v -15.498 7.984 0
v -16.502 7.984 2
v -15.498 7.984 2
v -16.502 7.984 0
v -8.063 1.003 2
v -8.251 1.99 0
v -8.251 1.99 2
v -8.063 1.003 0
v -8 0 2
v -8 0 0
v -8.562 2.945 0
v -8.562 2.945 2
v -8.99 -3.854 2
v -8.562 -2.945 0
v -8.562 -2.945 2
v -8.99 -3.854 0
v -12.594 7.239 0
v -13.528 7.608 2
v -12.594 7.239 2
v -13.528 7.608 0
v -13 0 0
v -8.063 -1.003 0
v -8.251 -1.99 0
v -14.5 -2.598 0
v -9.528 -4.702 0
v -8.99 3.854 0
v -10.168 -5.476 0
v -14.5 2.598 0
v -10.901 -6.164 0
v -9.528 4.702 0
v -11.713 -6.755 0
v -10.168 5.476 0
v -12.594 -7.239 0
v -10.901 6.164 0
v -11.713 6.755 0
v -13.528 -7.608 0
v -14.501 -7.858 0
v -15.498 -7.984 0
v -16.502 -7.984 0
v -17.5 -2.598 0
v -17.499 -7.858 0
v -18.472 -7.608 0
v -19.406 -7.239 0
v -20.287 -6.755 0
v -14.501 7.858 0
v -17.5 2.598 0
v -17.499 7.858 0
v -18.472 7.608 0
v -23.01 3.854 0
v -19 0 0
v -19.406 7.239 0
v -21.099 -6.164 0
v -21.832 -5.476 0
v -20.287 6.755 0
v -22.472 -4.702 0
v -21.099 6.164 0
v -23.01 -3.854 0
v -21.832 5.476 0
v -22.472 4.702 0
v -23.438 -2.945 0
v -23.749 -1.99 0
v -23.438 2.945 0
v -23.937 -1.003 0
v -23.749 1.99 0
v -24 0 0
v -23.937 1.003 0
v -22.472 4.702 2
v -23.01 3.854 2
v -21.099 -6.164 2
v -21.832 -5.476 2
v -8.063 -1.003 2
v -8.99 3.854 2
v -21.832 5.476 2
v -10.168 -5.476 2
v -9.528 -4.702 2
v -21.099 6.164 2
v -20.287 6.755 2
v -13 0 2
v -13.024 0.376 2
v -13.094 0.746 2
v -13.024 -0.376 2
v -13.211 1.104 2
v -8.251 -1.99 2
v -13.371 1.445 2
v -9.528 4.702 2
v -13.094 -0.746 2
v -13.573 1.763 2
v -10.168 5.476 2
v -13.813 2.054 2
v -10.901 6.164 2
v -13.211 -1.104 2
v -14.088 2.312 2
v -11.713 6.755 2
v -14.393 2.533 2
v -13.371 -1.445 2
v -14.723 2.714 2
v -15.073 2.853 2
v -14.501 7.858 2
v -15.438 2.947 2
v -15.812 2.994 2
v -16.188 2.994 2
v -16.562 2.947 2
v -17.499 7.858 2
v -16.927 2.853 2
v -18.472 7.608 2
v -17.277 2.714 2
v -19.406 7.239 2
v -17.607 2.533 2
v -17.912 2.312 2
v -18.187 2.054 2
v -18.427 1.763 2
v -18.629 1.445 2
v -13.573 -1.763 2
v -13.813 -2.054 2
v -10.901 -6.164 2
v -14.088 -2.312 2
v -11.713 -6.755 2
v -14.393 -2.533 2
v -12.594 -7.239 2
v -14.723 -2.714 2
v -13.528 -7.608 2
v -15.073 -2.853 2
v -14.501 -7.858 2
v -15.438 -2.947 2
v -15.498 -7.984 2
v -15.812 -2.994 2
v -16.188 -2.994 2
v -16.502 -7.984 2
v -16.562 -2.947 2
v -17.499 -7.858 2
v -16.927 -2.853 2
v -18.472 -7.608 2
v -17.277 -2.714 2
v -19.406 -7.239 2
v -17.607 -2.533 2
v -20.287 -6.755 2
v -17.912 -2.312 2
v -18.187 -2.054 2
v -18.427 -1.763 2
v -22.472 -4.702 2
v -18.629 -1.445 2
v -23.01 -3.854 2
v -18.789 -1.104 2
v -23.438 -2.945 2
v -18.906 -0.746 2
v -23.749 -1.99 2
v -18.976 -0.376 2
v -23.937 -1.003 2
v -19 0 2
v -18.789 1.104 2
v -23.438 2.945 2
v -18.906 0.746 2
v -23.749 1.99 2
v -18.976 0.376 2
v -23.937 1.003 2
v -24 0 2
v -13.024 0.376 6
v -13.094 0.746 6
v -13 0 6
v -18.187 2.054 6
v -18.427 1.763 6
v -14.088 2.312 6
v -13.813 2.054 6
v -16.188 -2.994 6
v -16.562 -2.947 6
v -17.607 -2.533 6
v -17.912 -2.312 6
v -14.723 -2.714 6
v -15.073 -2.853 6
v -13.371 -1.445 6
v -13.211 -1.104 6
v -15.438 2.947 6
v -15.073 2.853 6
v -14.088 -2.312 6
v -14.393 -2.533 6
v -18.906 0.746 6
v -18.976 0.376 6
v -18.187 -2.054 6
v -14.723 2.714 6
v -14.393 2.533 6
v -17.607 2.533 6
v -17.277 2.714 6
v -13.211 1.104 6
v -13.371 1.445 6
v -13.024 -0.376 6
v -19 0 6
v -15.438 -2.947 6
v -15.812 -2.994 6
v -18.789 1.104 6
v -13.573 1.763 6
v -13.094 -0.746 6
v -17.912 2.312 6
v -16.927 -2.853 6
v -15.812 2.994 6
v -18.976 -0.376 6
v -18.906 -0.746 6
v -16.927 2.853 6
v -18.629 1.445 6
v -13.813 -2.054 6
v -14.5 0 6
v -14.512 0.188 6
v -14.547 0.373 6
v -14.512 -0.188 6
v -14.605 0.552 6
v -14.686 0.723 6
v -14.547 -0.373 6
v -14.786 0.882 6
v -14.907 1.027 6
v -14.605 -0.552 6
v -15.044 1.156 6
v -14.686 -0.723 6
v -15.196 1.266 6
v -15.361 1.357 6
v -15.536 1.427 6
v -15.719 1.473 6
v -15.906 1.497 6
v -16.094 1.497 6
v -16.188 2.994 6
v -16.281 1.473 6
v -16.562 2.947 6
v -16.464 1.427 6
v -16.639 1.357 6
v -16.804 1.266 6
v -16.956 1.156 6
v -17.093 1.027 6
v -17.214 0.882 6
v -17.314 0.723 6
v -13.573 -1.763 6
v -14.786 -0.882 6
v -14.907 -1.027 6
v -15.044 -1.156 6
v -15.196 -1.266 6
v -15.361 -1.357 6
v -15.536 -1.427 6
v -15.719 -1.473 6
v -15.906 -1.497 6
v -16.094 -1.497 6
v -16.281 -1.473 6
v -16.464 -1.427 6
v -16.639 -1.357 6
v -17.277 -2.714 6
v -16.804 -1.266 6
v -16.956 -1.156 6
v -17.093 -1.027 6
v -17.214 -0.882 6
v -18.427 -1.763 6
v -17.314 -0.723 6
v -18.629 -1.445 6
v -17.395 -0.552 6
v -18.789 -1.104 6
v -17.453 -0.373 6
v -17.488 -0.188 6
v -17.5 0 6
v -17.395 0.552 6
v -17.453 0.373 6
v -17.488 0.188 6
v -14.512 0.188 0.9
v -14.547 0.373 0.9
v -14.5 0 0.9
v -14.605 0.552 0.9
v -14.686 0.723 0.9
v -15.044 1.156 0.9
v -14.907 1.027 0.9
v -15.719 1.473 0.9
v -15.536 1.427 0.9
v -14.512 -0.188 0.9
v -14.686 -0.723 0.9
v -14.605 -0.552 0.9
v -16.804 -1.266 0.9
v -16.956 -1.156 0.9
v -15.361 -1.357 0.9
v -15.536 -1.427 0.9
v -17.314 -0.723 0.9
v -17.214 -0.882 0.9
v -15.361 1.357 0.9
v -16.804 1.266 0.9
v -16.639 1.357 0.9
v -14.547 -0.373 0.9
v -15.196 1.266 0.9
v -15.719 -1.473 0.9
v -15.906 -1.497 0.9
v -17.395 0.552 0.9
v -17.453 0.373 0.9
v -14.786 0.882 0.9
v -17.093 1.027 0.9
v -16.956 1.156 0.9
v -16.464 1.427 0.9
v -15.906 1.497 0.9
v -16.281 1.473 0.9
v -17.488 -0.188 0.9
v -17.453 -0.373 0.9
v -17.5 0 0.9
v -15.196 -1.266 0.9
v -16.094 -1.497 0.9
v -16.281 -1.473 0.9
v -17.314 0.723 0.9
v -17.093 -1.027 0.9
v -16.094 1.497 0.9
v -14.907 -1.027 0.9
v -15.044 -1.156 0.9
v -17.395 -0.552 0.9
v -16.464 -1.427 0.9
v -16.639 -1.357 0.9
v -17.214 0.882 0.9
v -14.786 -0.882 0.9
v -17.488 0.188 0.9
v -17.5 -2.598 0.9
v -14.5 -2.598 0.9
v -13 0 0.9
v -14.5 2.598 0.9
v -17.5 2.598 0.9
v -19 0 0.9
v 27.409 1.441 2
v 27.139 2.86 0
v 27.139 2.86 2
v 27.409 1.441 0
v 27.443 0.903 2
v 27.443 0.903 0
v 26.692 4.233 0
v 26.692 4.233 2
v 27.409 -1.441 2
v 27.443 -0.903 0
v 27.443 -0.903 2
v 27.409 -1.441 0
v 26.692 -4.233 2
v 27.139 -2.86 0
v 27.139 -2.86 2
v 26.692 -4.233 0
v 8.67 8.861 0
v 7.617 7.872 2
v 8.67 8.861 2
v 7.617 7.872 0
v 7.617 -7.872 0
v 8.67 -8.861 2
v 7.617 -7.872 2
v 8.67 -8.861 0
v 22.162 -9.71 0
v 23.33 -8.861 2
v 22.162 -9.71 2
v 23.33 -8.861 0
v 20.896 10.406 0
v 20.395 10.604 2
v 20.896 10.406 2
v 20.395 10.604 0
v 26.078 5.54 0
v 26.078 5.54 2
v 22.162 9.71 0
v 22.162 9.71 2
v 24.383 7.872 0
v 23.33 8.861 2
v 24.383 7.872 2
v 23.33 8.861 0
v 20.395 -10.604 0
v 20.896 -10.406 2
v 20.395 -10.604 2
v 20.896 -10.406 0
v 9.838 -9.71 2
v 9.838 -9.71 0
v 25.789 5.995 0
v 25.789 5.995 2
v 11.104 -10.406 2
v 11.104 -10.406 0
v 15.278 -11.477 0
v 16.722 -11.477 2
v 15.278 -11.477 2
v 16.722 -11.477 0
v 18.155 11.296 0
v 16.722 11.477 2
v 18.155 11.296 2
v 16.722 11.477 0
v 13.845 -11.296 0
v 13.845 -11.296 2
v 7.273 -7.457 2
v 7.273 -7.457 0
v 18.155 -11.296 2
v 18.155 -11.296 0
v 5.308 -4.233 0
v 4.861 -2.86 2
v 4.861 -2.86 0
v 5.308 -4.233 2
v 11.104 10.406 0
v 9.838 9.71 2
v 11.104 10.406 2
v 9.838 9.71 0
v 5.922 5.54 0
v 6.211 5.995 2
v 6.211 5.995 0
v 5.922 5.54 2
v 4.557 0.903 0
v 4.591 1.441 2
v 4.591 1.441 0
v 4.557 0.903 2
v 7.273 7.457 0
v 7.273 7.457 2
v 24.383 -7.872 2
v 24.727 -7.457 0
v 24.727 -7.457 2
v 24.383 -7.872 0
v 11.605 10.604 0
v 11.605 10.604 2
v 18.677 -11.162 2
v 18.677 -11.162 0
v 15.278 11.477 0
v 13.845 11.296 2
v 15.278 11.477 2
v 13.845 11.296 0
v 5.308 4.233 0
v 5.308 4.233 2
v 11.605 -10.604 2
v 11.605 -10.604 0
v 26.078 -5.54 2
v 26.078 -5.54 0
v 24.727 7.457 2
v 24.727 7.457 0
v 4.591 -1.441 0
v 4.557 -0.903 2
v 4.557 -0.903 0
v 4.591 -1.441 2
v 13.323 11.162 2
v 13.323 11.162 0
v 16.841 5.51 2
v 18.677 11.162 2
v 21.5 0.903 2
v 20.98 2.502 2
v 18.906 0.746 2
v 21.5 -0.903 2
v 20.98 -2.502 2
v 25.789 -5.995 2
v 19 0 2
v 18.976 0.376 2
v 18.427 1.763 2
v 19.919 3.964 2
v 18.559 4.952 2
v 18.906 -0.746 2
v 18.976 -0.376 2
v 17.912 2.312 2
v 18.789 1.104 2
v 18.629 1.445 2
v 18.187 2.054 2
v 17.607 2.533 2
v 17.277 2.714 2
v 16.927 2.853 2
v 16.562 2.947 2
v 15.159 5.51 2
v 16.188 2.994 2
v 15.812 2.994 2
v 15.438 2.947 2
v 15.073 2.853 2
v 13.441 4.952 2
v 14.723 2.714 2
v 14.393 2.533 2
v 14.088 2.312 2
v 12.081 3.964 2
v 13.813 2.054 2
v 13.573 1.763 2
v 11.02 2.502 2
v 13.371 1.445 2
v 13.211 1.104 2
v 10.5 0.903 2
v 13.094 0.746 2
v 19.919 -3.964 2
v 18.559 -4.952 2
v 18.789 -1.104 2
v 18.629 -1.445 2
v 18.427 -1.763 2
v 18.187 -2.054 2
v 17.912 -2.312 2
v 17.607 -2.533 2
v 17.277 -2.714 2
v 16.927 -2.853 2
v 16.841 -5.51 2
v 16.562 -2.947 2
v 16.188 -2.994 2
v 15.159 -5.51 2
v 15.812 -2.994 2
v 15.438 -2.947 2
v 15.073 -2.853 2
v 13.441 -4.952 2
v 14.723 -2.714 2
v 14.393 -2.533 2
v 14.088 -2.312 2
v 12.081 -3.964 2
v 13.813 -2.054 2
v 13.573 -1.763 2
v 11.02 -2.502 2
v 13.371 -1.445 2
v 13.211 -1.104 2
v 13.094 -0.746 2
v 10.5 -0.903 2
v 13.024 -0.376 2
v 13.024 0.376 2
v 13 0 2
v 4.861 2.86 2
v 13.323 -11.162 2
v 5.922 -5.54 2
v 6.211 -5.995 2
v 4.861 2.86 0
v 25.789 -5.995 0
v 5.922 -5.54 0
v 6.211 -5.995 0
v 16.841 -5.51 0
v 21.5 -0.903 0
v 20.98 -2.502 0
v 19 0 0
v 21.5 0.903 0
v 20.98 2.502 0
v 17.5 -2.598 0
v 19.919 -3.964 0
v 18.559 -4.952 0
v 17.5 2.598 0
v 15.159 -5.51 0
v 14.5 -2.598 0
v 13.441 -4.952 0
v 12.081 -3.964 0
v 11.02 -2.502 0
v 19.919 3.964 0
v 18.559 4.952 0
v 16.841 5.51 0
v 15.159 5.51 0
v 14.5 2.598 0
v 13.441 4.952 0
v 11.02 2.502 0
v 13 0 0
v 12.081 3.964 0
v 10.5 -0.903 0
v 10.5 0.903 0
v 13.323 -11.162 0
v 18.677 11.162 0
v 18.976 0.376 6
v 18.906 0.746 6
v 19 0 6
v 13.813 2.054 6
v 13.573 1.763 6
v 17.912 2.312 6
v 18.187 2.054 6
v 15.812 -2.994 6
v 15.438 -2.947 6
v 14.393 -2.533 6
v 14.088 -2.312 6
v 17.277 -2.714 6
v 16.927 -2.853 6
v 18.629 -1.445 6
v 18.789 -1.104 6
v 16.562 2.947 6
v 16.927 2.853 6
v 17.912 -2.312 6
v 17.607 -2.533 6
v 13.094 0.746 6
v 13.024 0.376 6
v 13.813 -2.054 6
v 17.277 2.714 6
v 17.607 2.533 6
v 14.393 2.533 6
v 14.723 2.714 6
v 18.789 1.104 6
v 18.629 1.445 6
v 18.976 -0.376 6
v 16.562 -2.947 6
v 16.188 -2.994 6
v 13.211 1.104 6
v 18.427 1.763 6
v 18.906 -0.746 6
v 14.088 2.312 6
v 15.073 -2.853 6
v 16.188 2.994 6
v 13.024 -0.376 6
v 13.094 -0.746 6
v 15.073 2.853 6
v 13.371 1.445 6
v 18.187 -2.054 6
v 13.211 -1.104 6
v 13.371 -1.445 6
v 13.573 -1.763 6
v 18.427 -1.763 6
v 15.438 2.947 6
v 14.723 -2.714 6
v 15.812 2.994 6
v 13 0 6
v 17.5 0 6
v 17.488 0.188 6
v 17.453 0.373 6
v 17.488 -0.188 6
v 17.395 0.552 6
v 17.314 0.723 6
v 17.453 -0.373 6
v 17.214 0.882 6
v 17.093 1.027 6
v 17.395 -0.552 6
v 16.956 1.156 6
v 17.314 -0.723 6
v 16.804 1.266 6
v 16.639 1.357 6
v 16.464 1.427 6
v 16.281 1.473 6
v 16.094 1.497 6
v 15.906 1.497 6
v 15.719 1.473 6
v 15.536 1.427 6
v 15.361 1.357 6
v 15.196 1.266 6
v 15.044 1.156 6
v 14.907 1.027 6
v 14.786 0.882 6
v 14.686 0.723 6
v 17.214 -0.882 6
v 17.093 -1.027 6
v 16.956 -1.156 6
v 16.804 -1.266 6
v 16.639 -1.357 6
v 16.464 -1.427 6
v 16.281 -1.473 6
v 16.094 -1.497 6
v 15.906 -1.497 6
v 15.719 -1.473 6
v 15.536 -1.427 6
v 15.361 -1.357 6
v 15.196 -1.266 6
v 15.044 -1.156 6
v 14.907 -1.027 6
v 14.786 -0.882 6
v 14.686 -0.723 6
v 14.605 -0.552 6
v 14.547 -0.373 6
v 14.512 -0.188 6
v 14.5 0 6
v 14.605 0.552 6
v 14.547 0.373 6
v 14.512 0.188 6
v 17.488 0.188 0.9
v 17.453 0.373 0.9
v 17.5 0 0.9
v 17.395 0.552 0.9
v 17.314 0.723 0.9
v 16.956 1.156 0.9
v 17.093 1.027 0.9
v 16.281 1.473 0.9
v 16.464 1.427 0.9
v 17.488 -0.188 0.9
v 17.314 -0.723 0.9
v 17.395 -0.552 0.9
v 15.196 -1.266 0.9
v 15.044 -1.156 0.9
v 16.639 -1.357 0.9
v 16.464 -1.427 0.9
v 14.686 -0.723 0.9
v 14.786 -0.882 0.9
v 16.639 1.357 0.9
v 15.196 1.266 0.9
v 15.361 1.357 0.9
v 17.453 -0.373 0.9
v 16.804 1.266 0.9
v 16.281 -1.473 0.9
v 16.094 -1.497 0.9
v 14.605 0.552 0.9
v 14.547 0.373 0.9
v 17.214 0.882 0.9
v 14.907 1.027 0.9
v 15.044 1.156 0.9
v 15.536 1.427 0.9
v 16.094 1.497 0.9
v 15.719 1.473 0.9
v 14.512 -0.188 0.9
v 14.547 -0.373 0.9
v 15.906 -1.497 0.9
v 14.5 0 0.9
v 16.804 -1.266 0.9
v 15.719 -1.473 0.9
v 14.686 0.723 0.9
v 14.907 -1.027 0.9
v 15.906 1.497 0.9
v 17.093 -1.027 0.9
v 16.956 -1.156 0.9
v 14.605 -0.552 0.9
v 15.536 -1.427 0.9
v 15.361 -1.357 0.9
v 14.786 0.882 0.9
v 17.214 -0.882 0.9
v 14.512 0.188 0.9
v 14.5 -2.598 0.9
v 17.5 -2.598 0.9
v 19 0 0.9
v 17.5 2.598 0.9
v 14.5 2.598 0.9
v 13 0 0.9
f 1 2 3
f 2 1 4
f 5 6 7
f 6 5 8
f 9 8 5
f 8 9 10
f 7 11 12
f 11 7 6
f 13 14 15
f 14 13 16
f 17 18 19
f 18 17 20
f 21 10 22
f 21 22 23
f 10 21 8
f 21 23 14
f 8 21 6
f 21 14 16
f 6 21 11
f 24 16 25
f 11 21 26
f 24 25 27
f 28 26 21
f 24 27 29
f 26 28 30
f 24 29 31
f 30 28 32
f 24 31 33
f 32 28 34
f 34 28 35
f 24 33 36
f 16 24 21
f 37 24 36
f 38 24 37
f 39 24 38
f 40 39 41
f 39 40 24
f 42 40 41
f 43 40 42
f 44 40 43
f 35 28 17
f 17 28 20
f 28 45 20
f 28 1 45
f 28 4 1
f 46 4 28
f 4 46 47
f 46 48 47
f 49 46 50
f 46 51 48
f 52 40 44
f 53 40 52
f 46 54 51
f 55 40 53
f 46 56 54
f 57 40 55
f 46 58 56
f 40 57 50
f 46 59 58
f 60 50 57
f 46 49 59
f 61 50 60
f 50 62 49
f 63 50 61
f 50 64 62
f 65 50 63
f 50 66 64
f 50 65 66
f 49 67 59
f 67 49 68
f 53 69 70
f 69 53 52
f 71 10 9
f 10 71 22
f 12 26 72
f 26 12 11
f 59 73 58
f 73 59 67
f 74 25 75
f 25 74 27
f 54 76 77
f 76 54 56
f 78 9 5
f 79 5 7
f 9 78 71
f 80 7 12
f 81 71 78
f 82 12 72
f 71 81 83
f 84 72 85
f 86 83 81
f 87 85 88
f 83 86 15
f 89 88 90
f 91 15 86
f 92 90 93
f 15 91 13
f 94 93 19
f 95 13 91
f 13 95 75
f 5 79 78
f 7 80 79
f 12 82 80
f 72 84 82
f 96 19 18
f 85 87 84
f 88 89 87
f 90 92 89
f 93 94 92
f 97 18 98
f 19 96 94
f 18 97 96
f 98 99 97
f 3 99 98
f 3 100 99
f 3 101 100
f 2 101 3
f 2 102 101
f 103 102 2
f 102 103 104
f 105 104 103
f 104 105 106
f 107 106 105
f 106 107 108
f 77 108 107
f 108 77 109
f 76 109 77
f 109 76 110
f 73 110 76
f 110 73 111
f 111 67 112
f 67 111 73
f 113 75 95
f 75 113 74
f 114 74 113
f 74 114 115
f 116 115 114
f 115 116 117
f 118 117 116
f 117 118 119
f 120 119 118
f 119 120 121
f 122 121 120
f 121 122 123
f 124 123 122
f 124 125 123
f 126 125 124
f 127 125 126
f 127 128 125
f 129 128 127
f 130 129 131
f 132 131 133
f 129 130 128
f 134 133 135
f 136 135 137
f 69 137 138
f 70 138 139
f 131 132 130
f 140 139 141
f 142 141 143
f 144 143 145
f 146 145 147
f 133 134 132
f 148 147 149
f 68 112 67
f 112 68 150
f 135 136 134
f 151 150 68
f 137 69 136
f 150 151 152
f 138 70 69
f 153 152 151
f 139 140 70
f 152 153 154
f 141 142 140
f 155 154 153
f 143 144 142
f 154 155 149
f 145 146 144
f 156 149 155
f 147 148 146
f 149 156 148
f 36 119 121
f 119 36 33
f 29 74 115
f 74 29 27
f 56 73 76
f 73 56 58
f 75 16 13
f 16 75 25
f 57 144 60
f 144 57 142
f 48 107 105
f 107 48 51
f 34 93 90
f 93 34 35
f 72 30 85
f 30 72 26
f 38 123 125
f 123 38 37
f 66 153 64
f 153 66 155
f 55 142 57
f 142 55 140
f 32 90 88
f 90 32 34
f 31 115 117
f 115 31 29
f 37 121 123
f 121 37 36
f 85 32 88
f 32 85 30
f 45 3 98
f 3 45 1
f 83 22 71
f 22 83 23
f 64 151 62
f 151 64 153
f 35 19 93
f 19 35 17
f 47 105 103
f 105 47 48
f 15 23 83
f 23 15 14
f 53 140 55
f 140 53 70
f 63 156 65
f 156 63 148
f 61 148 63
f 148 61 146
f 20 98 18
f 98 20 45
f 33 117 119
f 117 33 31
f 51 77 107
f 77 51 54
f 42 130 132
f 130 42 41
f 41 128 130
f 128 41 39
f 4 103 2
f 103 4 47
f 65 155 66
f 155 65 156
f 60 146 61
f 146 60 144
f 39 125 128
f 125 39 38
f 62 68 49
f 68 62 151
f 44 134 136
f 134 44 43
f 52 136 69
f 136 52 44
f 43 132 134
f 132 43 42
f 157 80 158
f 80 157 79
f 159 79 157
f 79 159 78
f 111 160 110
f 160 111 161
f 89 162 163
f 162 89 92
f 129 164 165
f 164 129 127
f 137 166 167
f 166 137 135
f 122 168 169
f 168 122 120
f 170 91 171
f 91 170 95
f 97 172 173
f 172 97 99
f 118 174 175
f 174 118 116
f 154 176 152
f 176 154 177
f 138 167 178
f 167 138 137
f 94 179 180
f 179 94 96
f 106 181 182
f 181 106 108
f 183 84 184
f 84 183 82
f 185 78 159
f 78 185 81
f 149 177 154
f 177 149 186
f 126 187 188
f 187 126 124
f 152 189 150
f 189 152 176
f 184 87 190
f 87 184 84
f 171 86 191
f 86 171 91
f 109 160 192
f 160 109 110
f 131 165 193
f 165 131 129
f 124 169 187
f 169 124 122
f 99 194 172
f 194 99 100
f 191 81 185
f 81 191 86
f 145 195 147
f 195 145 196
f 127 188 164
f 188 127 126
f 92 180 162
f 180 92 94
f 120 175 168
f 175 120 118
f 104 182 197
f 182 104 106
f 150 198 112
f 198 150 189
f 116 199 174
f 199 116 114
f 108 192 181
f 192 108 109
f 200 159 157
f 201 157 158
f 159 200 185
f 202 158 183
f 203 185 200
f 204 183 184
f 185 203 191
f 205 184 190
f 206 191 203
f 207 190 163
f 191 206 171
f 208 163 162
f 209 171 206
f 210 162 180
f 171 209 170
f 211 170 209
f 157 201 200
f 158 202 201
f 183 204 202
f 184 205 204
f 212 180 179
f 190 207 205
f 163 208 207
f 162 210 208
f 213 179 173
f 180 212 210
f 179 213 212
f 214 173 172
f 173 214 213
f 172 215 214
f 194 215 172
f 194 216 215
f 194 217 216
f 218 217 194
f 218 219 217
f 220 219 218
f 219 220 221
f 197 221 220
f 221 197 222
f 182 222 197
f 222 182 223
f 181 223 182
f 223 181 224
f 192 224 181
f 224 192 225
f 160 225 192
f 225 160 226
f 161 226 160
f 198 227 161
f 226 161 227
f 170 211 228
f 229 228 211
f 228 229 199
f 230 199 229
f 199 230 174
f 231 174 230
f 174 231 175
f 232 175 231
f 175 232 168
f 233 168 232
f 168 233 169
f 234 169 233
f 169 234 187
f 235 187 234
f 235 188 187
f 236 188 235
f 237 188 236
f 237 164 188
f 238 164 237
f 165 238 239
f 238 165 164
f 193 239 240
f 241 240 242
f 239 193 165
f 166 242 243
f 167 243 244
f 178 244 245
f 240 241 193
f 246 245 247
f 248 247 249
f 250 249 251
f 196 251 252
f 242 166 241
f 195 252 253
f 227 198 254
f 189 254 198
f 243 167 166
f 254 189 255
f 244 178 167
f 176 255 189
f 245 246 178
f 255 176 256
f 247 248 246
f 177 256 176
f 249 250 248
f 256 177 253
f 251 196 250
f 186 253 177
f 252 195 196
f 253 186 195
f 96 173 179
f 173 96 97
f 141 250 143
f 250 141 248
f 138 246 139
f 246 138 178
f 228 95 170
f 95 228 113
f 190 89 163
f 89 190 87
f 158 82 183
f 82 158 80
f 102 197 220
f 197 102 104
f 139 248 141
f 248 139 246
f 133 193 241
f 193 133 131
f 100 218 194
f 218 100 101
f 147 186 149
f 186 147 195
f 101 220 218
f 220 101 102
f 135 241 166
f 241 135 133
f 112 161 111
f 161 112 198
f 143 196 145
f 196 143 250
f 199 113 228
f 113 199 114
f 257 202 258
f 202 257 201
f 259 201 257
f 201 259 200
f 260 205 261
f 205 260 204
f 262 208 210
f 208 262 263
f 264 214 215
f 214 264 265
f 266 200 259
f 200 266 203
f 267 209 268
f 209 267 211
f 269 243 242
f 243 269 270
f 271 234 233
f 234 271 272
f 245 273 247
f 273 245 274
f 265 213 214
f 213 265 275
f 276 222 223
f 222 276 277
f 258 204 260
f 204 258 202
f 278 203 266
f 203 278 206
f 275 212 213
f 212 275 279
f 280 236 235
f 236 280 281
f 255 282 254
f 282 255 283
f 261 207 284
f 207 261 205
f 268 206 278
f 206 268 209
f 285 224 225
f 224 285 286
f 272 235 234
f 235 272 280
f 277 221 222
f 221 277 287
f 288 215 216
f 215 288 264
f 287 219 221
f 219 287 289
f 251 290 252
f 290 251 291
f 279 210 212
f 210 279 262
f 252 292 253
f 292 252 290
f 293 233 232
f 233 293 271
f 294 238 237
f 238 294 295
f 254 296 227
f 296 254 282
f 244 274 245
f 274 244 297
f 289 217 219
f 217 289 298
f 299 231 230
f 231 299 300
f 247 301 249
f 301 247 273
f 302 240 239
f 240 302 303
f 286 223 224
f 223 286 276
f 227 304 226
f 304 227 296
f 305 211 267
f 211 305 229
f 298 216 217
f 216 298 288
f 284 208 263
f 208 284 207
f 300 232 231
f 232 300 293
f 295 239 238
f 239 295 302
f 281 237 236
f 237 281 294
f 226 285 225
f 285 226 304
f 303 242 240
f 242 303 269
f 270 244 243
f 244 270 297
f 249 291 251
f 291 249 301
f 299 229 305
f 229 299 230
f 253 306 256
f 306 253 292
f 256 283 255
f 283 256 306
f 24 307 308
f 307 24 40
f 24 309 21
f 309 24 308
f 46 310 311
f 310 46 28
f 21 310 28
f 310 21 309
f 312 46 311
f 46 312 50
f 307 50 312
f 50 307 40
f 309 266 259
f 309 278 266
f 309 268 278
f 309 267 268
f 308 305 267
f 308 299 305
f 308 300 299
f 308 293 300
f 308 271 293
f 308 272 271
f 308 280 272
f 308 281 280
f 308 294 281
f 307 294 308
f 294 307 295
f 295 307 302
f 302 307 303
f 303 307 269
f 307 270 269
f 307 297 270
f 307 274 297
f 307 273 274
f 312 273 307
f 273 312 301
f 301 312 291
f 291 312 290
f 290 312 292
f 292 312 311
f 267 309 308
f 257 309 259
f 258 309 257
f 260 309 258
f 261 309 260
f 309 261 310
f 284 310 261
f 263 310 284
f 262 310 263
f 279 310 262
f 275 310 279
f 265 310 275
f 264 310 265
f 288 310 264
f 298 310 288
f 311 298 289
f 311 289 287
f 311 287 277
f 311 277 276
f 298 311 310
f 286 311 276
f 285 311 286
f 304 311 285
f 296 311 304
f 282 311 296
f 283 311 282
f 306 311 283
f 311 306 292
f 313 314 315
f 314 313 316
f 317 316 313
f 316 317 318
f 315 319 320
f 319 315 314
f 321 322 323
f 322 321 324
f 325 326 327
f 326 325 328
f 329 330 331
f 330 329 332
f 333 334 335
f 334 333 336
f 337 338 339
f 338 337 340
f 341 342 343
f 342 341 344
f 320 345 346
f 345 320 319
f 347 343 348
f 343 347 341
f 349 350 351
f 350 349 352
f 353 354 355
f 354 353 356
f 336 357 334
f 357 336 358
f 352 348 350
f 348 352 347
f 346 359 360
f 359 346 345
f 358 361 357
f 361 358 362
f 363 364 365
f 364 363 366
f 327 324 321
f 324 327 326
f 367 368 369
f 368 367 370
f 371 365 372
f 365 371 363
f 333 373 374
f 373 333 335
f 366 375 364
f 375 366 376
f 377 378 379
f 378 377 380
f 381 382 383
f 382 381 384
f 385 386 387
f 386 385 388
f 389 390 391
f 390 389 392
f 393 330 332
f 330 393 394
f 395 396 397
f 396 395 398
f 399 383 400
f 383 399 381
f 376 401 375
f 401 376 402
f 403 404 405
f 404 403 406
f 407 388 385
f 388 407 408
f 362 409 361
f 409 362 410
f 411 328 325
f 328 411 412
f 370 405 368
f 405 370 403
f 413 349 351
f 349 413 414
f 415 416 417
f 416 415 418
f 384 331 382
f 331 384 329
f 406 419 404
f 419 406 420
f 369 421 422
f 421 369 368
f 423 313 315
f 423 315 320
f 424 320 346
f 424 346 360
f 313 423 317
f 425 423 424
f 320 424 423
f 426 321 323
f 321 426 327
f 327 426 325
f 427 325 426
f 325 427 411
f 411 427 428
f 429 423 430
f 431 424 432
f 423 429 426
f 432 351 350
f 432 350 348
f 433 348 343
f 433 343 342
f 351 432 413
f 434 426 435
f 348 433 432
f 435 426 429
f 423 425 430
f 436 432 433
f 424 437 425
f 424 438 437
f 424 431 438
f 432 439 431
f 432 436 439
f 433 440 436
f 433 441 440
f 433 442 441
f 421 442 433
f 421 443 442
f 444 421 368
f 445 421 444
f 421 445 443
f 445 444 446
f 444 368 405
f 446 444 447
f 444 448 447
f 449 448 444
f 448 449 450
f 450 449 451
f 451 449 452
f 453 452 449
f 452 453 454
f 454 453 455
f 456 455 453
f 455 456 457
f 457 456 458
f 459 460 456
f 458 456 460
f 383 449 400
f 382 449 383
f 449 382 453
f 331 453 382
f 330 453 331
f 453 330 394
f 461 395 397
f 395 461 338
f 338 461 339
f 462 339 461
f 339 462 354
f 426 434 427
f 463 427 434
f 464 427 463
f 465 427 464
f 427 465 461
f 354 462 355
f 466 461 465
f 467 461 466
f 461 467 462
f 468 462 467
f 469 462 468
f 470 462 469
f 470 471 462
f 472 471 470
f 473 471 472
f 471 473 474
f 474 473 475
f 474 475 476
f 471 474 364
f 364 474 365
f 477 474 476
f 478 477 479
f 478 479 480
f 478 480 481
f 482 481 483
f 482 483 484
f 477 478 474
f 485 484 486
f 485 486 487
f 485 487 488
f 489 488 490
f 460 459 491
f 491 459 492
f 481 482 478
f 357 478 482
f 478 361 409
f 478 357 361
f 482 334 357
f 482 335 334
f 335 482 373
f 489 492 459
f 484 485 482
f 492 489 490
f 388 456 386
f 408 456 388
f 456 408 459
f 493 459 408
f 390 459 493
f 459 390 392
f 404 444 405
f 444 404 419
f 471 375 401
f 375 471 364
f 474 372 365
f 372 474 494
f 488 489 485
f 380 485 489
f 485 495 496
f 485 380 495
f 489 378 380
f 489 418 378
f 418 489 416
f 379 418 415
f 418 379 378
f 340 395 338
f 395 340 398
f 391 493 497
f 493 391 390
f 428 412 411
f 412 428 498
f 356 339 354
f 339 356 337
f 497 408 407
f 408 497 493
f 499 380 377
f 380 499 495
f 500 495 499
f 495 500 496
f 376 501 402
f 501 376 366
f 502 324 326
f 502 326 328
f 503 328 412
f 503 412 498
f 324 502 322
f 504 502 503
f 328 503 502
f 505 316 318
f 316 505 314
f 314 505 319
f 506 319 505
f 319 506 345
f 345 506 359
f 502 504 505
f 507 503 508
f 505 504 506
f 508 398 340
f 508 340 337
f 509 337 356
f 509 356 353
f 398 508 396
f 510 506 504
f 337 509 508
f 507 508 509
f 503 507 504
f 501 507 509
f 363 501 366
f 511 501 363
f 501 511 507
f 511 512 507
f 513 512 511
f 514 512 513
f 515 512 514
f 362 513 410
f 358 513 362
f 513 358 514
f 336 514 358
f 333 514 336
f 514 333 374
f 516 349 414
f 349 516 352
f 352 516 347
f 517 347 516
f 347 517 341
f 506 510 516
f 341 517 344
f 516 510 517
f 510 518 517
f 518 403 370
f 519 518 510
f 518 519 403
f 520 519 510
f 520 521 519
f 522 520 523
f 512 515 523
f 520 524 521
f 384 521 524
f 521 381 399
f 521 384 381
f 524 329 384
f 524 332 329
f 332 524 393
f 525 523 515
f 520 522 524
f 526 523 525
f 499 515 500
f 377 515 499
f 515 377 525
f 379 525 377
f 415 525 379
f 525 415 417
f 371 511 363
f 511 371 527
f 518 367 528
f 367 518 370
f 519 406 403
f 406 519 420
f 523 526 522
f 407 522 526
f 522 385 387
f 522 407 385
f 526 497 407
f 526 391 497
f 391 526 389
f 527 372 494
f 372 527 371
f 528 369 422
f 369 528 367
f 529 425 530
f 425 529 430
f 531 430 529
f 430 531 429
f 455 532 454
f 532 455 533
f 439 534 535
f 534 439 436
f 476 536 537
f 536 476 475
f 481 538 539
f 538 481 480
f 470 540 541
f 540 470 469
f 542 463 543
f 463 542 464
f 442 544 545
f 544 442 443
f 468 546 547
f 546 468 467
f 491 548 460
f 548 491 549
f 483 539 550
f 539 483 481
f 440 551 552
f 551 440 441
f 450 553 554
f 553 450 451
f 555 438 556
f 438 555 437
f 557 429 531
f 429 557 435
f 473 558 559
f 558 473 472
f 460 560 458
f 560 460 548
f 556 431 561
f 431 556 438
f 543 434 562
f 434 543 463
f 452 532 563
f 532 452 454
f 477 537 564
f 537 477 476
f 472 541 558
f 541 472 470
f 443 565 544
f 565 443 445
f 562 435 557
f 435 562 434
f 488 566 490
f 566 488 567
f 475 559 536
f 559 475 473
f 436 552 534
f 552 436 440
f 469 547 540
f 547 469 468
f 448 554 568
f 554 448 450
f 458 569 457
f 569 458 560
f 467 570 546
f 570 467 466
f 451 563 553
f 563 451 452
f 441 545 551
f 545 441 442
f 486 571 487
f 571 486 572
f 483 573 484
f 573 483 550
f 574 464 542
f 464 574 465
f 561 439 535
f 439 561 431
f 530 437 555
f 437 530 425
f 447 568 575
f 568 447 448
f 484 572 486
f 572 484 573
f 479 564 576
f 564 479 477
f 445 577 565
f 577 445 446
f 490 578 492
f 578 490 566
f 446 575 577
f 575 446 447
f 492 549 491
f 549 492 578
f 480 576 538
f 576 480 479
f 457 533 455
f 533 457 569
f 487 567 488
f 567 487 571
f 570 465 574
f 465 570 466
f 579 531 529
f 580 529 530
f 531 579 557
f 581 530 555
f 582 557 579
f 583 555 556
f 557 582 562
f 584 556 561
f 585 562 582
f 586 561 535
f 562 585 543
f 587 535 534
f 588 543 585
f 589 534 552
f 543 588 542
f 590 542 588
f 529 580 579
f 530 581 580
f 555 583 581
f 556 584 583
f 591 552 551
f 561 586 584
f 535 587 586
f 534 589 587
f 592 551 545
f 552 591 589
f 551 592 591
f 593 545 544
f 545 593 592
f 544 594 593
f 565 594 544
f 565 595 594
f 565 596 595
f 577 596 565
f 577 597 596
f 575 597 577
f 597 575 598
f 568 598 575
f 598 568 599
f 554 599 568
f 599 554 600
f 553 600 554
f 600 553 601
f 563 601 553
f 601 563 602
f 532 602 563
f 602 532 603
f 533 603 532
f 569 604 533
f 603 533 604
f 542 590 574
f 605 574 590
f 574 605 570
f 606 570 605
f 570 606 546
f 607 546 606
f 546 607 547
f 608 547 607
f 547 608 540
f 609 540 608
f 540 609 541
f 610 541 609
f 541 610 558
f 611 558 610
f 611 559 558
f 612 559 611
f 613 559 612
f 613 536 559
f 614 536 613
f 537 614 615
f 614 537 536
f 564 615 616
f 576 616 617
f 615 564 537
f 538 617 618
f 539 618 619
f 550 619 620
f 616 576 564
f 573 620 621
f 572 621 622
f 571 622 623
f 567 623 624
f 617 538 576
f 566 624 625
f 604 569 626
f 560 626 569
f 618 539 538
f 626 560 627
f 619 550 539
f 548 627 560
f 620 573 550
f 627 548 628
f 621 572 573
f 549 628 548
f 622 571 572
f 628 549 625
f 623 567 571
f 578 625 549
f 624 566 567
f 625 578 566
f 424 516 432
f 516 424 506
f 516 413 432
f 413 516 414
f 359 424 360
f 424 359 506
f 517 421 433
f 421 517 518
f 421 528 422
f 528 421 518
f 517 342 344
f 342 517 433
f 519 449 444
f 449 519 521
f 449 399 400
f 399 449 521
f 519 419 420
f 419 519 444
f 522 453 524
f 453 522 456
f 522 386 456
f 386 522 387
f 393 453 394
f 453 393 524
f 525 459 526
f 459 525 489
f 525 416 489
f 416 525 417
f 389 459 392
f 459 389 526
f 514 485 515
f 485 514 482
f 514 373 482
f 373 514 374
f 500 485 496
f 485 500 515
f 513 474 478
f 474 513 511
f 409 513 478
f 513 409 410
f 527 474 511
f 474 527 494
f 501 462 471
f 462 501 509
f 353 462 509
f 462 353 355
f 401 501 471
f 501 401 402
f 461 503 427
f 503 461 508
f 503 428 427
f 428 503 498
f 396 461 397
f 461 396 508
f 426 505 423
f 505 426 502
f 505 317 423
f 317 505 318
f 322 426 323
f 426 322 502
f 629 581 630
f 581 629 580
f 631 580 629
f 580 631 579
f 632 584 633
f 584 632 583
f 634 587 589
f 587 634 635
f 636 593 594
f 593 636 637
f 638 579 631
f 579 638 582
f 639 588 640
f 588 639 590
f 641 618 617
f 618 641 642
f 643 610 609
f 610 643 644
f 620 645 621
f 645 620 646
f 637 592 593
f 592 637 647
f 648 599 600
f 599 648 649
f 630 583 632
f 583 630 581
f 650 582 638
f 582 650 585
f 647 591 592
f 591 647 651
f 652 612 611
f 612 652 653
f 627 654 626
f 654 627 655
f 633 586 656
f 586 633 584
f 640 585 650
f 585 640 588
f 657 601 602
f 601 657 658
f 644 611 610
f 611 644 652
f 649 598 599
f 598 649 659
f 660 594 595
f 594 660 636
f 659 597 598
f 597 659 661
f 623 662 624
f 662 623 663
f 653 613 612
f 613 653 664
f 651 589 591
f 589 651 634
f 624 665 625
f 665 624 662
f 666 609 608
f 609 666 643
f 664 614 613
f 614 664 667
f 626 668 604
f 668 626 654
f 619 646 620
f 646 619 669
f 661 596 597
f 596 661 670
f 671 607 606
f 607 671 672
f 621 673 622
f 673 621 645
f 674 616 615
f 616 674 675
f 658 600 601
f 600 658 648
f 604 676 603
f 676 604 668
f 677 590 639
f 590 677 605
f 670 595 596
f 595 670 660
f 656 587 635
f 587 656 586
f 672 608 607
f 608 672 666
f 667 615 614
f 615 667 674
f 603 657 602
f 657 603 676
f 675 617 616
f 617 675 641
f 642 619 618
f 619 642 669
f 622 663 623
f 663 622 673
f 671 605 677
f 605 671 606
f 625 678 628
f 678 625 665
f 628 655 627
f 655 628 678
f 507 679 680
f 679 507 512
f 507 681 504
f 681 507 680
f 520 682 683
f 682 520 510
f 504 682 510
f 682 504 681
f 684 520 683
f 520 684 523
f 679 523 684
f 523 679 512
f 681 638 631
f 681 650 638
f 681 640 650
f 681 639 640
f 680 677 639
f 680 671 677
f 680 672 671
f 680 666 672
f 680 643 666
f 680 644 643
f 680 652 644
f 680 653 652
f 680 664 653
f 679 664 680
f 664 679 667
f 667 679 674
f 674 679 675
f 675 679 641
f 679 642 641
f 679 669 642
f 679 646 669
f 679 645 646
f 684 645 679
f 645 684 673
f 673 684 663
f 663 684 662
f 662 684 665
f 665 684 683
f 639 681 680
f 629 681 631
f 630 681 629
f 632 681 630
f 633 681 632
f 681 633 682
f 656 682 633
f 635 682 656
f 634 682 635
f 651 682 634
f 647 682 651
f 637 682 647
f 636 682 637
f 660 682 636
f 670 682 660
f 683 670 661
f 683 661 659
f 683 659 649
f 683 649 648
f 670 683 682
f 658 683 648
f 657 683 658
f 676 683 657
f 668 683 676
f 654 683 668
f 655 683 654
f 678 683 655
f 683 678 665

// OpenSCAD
WheelExternalDiameter = 16;
WheelInternalDiameter = 6;
WheelHeight = 12;

ScrewDiameter = 3;
NutExternalSize = 6;

EncoderTeeth = 10;

Mode = "Print"; // [Print, View]

/* [HIDDEN] */

$fn=50;
if(Mode == "View"){
    translate([0,0,5]) 
        rubberWheel(WheelExternalDiameter,WheelInternalDiameter,WheelHeight);
    wheelHolder(0);
    translate([0,0,10+WheelHeight]) 
        rotate(a=[180,0]) wheelHolder(EncoderTeeth);
}else{
    translate([-WheelExternalDiameter,0,0]) 
        wheelHolder(0);
    translate([WheelExternalDiameter,0,0]) 
        wheelHolder(EncoderTeeth);
}
module wheelHolder(EncoderTeeth=0){    
    h = 2;
    encSize = 7;
    s = EncoderTeeth<1 ? WheelExternalDiameter:WheelExternalDiameter+encSize;
    difference(){
        union(){
            cylinder(d=s,h=h);
            cylinder(d=WheelInternalDiameter,h=h+WheelHeight/3);
        }
        translate([0,0,-1]) 
            cylinder(d=ScrewDiameter,h=WheelHeight);
        translate([0,0,-.1])
            cylinder(d=NutExternalSize,h=1,$fn=6);            
        if(EncoderTeeth>0){
            for(t=[1:EncoderTeeth]){
                w = (PI*s)/(EncoderTeeth*4);
                rotate(a=[0,0,t*360/EncoderTeeth])                
                    translate([s/2-encSize+1,-w/2,-.1]) 
                        cube([encSize,w,h*2]);
            }
        }
    }
}

module rubberWheel(ExD,InD,h){
    difference(){
        cylinder(d=ExD,h=h);
        translate([0,0,-1]) cylinder(d=InD,h=h+2);
    }
}
